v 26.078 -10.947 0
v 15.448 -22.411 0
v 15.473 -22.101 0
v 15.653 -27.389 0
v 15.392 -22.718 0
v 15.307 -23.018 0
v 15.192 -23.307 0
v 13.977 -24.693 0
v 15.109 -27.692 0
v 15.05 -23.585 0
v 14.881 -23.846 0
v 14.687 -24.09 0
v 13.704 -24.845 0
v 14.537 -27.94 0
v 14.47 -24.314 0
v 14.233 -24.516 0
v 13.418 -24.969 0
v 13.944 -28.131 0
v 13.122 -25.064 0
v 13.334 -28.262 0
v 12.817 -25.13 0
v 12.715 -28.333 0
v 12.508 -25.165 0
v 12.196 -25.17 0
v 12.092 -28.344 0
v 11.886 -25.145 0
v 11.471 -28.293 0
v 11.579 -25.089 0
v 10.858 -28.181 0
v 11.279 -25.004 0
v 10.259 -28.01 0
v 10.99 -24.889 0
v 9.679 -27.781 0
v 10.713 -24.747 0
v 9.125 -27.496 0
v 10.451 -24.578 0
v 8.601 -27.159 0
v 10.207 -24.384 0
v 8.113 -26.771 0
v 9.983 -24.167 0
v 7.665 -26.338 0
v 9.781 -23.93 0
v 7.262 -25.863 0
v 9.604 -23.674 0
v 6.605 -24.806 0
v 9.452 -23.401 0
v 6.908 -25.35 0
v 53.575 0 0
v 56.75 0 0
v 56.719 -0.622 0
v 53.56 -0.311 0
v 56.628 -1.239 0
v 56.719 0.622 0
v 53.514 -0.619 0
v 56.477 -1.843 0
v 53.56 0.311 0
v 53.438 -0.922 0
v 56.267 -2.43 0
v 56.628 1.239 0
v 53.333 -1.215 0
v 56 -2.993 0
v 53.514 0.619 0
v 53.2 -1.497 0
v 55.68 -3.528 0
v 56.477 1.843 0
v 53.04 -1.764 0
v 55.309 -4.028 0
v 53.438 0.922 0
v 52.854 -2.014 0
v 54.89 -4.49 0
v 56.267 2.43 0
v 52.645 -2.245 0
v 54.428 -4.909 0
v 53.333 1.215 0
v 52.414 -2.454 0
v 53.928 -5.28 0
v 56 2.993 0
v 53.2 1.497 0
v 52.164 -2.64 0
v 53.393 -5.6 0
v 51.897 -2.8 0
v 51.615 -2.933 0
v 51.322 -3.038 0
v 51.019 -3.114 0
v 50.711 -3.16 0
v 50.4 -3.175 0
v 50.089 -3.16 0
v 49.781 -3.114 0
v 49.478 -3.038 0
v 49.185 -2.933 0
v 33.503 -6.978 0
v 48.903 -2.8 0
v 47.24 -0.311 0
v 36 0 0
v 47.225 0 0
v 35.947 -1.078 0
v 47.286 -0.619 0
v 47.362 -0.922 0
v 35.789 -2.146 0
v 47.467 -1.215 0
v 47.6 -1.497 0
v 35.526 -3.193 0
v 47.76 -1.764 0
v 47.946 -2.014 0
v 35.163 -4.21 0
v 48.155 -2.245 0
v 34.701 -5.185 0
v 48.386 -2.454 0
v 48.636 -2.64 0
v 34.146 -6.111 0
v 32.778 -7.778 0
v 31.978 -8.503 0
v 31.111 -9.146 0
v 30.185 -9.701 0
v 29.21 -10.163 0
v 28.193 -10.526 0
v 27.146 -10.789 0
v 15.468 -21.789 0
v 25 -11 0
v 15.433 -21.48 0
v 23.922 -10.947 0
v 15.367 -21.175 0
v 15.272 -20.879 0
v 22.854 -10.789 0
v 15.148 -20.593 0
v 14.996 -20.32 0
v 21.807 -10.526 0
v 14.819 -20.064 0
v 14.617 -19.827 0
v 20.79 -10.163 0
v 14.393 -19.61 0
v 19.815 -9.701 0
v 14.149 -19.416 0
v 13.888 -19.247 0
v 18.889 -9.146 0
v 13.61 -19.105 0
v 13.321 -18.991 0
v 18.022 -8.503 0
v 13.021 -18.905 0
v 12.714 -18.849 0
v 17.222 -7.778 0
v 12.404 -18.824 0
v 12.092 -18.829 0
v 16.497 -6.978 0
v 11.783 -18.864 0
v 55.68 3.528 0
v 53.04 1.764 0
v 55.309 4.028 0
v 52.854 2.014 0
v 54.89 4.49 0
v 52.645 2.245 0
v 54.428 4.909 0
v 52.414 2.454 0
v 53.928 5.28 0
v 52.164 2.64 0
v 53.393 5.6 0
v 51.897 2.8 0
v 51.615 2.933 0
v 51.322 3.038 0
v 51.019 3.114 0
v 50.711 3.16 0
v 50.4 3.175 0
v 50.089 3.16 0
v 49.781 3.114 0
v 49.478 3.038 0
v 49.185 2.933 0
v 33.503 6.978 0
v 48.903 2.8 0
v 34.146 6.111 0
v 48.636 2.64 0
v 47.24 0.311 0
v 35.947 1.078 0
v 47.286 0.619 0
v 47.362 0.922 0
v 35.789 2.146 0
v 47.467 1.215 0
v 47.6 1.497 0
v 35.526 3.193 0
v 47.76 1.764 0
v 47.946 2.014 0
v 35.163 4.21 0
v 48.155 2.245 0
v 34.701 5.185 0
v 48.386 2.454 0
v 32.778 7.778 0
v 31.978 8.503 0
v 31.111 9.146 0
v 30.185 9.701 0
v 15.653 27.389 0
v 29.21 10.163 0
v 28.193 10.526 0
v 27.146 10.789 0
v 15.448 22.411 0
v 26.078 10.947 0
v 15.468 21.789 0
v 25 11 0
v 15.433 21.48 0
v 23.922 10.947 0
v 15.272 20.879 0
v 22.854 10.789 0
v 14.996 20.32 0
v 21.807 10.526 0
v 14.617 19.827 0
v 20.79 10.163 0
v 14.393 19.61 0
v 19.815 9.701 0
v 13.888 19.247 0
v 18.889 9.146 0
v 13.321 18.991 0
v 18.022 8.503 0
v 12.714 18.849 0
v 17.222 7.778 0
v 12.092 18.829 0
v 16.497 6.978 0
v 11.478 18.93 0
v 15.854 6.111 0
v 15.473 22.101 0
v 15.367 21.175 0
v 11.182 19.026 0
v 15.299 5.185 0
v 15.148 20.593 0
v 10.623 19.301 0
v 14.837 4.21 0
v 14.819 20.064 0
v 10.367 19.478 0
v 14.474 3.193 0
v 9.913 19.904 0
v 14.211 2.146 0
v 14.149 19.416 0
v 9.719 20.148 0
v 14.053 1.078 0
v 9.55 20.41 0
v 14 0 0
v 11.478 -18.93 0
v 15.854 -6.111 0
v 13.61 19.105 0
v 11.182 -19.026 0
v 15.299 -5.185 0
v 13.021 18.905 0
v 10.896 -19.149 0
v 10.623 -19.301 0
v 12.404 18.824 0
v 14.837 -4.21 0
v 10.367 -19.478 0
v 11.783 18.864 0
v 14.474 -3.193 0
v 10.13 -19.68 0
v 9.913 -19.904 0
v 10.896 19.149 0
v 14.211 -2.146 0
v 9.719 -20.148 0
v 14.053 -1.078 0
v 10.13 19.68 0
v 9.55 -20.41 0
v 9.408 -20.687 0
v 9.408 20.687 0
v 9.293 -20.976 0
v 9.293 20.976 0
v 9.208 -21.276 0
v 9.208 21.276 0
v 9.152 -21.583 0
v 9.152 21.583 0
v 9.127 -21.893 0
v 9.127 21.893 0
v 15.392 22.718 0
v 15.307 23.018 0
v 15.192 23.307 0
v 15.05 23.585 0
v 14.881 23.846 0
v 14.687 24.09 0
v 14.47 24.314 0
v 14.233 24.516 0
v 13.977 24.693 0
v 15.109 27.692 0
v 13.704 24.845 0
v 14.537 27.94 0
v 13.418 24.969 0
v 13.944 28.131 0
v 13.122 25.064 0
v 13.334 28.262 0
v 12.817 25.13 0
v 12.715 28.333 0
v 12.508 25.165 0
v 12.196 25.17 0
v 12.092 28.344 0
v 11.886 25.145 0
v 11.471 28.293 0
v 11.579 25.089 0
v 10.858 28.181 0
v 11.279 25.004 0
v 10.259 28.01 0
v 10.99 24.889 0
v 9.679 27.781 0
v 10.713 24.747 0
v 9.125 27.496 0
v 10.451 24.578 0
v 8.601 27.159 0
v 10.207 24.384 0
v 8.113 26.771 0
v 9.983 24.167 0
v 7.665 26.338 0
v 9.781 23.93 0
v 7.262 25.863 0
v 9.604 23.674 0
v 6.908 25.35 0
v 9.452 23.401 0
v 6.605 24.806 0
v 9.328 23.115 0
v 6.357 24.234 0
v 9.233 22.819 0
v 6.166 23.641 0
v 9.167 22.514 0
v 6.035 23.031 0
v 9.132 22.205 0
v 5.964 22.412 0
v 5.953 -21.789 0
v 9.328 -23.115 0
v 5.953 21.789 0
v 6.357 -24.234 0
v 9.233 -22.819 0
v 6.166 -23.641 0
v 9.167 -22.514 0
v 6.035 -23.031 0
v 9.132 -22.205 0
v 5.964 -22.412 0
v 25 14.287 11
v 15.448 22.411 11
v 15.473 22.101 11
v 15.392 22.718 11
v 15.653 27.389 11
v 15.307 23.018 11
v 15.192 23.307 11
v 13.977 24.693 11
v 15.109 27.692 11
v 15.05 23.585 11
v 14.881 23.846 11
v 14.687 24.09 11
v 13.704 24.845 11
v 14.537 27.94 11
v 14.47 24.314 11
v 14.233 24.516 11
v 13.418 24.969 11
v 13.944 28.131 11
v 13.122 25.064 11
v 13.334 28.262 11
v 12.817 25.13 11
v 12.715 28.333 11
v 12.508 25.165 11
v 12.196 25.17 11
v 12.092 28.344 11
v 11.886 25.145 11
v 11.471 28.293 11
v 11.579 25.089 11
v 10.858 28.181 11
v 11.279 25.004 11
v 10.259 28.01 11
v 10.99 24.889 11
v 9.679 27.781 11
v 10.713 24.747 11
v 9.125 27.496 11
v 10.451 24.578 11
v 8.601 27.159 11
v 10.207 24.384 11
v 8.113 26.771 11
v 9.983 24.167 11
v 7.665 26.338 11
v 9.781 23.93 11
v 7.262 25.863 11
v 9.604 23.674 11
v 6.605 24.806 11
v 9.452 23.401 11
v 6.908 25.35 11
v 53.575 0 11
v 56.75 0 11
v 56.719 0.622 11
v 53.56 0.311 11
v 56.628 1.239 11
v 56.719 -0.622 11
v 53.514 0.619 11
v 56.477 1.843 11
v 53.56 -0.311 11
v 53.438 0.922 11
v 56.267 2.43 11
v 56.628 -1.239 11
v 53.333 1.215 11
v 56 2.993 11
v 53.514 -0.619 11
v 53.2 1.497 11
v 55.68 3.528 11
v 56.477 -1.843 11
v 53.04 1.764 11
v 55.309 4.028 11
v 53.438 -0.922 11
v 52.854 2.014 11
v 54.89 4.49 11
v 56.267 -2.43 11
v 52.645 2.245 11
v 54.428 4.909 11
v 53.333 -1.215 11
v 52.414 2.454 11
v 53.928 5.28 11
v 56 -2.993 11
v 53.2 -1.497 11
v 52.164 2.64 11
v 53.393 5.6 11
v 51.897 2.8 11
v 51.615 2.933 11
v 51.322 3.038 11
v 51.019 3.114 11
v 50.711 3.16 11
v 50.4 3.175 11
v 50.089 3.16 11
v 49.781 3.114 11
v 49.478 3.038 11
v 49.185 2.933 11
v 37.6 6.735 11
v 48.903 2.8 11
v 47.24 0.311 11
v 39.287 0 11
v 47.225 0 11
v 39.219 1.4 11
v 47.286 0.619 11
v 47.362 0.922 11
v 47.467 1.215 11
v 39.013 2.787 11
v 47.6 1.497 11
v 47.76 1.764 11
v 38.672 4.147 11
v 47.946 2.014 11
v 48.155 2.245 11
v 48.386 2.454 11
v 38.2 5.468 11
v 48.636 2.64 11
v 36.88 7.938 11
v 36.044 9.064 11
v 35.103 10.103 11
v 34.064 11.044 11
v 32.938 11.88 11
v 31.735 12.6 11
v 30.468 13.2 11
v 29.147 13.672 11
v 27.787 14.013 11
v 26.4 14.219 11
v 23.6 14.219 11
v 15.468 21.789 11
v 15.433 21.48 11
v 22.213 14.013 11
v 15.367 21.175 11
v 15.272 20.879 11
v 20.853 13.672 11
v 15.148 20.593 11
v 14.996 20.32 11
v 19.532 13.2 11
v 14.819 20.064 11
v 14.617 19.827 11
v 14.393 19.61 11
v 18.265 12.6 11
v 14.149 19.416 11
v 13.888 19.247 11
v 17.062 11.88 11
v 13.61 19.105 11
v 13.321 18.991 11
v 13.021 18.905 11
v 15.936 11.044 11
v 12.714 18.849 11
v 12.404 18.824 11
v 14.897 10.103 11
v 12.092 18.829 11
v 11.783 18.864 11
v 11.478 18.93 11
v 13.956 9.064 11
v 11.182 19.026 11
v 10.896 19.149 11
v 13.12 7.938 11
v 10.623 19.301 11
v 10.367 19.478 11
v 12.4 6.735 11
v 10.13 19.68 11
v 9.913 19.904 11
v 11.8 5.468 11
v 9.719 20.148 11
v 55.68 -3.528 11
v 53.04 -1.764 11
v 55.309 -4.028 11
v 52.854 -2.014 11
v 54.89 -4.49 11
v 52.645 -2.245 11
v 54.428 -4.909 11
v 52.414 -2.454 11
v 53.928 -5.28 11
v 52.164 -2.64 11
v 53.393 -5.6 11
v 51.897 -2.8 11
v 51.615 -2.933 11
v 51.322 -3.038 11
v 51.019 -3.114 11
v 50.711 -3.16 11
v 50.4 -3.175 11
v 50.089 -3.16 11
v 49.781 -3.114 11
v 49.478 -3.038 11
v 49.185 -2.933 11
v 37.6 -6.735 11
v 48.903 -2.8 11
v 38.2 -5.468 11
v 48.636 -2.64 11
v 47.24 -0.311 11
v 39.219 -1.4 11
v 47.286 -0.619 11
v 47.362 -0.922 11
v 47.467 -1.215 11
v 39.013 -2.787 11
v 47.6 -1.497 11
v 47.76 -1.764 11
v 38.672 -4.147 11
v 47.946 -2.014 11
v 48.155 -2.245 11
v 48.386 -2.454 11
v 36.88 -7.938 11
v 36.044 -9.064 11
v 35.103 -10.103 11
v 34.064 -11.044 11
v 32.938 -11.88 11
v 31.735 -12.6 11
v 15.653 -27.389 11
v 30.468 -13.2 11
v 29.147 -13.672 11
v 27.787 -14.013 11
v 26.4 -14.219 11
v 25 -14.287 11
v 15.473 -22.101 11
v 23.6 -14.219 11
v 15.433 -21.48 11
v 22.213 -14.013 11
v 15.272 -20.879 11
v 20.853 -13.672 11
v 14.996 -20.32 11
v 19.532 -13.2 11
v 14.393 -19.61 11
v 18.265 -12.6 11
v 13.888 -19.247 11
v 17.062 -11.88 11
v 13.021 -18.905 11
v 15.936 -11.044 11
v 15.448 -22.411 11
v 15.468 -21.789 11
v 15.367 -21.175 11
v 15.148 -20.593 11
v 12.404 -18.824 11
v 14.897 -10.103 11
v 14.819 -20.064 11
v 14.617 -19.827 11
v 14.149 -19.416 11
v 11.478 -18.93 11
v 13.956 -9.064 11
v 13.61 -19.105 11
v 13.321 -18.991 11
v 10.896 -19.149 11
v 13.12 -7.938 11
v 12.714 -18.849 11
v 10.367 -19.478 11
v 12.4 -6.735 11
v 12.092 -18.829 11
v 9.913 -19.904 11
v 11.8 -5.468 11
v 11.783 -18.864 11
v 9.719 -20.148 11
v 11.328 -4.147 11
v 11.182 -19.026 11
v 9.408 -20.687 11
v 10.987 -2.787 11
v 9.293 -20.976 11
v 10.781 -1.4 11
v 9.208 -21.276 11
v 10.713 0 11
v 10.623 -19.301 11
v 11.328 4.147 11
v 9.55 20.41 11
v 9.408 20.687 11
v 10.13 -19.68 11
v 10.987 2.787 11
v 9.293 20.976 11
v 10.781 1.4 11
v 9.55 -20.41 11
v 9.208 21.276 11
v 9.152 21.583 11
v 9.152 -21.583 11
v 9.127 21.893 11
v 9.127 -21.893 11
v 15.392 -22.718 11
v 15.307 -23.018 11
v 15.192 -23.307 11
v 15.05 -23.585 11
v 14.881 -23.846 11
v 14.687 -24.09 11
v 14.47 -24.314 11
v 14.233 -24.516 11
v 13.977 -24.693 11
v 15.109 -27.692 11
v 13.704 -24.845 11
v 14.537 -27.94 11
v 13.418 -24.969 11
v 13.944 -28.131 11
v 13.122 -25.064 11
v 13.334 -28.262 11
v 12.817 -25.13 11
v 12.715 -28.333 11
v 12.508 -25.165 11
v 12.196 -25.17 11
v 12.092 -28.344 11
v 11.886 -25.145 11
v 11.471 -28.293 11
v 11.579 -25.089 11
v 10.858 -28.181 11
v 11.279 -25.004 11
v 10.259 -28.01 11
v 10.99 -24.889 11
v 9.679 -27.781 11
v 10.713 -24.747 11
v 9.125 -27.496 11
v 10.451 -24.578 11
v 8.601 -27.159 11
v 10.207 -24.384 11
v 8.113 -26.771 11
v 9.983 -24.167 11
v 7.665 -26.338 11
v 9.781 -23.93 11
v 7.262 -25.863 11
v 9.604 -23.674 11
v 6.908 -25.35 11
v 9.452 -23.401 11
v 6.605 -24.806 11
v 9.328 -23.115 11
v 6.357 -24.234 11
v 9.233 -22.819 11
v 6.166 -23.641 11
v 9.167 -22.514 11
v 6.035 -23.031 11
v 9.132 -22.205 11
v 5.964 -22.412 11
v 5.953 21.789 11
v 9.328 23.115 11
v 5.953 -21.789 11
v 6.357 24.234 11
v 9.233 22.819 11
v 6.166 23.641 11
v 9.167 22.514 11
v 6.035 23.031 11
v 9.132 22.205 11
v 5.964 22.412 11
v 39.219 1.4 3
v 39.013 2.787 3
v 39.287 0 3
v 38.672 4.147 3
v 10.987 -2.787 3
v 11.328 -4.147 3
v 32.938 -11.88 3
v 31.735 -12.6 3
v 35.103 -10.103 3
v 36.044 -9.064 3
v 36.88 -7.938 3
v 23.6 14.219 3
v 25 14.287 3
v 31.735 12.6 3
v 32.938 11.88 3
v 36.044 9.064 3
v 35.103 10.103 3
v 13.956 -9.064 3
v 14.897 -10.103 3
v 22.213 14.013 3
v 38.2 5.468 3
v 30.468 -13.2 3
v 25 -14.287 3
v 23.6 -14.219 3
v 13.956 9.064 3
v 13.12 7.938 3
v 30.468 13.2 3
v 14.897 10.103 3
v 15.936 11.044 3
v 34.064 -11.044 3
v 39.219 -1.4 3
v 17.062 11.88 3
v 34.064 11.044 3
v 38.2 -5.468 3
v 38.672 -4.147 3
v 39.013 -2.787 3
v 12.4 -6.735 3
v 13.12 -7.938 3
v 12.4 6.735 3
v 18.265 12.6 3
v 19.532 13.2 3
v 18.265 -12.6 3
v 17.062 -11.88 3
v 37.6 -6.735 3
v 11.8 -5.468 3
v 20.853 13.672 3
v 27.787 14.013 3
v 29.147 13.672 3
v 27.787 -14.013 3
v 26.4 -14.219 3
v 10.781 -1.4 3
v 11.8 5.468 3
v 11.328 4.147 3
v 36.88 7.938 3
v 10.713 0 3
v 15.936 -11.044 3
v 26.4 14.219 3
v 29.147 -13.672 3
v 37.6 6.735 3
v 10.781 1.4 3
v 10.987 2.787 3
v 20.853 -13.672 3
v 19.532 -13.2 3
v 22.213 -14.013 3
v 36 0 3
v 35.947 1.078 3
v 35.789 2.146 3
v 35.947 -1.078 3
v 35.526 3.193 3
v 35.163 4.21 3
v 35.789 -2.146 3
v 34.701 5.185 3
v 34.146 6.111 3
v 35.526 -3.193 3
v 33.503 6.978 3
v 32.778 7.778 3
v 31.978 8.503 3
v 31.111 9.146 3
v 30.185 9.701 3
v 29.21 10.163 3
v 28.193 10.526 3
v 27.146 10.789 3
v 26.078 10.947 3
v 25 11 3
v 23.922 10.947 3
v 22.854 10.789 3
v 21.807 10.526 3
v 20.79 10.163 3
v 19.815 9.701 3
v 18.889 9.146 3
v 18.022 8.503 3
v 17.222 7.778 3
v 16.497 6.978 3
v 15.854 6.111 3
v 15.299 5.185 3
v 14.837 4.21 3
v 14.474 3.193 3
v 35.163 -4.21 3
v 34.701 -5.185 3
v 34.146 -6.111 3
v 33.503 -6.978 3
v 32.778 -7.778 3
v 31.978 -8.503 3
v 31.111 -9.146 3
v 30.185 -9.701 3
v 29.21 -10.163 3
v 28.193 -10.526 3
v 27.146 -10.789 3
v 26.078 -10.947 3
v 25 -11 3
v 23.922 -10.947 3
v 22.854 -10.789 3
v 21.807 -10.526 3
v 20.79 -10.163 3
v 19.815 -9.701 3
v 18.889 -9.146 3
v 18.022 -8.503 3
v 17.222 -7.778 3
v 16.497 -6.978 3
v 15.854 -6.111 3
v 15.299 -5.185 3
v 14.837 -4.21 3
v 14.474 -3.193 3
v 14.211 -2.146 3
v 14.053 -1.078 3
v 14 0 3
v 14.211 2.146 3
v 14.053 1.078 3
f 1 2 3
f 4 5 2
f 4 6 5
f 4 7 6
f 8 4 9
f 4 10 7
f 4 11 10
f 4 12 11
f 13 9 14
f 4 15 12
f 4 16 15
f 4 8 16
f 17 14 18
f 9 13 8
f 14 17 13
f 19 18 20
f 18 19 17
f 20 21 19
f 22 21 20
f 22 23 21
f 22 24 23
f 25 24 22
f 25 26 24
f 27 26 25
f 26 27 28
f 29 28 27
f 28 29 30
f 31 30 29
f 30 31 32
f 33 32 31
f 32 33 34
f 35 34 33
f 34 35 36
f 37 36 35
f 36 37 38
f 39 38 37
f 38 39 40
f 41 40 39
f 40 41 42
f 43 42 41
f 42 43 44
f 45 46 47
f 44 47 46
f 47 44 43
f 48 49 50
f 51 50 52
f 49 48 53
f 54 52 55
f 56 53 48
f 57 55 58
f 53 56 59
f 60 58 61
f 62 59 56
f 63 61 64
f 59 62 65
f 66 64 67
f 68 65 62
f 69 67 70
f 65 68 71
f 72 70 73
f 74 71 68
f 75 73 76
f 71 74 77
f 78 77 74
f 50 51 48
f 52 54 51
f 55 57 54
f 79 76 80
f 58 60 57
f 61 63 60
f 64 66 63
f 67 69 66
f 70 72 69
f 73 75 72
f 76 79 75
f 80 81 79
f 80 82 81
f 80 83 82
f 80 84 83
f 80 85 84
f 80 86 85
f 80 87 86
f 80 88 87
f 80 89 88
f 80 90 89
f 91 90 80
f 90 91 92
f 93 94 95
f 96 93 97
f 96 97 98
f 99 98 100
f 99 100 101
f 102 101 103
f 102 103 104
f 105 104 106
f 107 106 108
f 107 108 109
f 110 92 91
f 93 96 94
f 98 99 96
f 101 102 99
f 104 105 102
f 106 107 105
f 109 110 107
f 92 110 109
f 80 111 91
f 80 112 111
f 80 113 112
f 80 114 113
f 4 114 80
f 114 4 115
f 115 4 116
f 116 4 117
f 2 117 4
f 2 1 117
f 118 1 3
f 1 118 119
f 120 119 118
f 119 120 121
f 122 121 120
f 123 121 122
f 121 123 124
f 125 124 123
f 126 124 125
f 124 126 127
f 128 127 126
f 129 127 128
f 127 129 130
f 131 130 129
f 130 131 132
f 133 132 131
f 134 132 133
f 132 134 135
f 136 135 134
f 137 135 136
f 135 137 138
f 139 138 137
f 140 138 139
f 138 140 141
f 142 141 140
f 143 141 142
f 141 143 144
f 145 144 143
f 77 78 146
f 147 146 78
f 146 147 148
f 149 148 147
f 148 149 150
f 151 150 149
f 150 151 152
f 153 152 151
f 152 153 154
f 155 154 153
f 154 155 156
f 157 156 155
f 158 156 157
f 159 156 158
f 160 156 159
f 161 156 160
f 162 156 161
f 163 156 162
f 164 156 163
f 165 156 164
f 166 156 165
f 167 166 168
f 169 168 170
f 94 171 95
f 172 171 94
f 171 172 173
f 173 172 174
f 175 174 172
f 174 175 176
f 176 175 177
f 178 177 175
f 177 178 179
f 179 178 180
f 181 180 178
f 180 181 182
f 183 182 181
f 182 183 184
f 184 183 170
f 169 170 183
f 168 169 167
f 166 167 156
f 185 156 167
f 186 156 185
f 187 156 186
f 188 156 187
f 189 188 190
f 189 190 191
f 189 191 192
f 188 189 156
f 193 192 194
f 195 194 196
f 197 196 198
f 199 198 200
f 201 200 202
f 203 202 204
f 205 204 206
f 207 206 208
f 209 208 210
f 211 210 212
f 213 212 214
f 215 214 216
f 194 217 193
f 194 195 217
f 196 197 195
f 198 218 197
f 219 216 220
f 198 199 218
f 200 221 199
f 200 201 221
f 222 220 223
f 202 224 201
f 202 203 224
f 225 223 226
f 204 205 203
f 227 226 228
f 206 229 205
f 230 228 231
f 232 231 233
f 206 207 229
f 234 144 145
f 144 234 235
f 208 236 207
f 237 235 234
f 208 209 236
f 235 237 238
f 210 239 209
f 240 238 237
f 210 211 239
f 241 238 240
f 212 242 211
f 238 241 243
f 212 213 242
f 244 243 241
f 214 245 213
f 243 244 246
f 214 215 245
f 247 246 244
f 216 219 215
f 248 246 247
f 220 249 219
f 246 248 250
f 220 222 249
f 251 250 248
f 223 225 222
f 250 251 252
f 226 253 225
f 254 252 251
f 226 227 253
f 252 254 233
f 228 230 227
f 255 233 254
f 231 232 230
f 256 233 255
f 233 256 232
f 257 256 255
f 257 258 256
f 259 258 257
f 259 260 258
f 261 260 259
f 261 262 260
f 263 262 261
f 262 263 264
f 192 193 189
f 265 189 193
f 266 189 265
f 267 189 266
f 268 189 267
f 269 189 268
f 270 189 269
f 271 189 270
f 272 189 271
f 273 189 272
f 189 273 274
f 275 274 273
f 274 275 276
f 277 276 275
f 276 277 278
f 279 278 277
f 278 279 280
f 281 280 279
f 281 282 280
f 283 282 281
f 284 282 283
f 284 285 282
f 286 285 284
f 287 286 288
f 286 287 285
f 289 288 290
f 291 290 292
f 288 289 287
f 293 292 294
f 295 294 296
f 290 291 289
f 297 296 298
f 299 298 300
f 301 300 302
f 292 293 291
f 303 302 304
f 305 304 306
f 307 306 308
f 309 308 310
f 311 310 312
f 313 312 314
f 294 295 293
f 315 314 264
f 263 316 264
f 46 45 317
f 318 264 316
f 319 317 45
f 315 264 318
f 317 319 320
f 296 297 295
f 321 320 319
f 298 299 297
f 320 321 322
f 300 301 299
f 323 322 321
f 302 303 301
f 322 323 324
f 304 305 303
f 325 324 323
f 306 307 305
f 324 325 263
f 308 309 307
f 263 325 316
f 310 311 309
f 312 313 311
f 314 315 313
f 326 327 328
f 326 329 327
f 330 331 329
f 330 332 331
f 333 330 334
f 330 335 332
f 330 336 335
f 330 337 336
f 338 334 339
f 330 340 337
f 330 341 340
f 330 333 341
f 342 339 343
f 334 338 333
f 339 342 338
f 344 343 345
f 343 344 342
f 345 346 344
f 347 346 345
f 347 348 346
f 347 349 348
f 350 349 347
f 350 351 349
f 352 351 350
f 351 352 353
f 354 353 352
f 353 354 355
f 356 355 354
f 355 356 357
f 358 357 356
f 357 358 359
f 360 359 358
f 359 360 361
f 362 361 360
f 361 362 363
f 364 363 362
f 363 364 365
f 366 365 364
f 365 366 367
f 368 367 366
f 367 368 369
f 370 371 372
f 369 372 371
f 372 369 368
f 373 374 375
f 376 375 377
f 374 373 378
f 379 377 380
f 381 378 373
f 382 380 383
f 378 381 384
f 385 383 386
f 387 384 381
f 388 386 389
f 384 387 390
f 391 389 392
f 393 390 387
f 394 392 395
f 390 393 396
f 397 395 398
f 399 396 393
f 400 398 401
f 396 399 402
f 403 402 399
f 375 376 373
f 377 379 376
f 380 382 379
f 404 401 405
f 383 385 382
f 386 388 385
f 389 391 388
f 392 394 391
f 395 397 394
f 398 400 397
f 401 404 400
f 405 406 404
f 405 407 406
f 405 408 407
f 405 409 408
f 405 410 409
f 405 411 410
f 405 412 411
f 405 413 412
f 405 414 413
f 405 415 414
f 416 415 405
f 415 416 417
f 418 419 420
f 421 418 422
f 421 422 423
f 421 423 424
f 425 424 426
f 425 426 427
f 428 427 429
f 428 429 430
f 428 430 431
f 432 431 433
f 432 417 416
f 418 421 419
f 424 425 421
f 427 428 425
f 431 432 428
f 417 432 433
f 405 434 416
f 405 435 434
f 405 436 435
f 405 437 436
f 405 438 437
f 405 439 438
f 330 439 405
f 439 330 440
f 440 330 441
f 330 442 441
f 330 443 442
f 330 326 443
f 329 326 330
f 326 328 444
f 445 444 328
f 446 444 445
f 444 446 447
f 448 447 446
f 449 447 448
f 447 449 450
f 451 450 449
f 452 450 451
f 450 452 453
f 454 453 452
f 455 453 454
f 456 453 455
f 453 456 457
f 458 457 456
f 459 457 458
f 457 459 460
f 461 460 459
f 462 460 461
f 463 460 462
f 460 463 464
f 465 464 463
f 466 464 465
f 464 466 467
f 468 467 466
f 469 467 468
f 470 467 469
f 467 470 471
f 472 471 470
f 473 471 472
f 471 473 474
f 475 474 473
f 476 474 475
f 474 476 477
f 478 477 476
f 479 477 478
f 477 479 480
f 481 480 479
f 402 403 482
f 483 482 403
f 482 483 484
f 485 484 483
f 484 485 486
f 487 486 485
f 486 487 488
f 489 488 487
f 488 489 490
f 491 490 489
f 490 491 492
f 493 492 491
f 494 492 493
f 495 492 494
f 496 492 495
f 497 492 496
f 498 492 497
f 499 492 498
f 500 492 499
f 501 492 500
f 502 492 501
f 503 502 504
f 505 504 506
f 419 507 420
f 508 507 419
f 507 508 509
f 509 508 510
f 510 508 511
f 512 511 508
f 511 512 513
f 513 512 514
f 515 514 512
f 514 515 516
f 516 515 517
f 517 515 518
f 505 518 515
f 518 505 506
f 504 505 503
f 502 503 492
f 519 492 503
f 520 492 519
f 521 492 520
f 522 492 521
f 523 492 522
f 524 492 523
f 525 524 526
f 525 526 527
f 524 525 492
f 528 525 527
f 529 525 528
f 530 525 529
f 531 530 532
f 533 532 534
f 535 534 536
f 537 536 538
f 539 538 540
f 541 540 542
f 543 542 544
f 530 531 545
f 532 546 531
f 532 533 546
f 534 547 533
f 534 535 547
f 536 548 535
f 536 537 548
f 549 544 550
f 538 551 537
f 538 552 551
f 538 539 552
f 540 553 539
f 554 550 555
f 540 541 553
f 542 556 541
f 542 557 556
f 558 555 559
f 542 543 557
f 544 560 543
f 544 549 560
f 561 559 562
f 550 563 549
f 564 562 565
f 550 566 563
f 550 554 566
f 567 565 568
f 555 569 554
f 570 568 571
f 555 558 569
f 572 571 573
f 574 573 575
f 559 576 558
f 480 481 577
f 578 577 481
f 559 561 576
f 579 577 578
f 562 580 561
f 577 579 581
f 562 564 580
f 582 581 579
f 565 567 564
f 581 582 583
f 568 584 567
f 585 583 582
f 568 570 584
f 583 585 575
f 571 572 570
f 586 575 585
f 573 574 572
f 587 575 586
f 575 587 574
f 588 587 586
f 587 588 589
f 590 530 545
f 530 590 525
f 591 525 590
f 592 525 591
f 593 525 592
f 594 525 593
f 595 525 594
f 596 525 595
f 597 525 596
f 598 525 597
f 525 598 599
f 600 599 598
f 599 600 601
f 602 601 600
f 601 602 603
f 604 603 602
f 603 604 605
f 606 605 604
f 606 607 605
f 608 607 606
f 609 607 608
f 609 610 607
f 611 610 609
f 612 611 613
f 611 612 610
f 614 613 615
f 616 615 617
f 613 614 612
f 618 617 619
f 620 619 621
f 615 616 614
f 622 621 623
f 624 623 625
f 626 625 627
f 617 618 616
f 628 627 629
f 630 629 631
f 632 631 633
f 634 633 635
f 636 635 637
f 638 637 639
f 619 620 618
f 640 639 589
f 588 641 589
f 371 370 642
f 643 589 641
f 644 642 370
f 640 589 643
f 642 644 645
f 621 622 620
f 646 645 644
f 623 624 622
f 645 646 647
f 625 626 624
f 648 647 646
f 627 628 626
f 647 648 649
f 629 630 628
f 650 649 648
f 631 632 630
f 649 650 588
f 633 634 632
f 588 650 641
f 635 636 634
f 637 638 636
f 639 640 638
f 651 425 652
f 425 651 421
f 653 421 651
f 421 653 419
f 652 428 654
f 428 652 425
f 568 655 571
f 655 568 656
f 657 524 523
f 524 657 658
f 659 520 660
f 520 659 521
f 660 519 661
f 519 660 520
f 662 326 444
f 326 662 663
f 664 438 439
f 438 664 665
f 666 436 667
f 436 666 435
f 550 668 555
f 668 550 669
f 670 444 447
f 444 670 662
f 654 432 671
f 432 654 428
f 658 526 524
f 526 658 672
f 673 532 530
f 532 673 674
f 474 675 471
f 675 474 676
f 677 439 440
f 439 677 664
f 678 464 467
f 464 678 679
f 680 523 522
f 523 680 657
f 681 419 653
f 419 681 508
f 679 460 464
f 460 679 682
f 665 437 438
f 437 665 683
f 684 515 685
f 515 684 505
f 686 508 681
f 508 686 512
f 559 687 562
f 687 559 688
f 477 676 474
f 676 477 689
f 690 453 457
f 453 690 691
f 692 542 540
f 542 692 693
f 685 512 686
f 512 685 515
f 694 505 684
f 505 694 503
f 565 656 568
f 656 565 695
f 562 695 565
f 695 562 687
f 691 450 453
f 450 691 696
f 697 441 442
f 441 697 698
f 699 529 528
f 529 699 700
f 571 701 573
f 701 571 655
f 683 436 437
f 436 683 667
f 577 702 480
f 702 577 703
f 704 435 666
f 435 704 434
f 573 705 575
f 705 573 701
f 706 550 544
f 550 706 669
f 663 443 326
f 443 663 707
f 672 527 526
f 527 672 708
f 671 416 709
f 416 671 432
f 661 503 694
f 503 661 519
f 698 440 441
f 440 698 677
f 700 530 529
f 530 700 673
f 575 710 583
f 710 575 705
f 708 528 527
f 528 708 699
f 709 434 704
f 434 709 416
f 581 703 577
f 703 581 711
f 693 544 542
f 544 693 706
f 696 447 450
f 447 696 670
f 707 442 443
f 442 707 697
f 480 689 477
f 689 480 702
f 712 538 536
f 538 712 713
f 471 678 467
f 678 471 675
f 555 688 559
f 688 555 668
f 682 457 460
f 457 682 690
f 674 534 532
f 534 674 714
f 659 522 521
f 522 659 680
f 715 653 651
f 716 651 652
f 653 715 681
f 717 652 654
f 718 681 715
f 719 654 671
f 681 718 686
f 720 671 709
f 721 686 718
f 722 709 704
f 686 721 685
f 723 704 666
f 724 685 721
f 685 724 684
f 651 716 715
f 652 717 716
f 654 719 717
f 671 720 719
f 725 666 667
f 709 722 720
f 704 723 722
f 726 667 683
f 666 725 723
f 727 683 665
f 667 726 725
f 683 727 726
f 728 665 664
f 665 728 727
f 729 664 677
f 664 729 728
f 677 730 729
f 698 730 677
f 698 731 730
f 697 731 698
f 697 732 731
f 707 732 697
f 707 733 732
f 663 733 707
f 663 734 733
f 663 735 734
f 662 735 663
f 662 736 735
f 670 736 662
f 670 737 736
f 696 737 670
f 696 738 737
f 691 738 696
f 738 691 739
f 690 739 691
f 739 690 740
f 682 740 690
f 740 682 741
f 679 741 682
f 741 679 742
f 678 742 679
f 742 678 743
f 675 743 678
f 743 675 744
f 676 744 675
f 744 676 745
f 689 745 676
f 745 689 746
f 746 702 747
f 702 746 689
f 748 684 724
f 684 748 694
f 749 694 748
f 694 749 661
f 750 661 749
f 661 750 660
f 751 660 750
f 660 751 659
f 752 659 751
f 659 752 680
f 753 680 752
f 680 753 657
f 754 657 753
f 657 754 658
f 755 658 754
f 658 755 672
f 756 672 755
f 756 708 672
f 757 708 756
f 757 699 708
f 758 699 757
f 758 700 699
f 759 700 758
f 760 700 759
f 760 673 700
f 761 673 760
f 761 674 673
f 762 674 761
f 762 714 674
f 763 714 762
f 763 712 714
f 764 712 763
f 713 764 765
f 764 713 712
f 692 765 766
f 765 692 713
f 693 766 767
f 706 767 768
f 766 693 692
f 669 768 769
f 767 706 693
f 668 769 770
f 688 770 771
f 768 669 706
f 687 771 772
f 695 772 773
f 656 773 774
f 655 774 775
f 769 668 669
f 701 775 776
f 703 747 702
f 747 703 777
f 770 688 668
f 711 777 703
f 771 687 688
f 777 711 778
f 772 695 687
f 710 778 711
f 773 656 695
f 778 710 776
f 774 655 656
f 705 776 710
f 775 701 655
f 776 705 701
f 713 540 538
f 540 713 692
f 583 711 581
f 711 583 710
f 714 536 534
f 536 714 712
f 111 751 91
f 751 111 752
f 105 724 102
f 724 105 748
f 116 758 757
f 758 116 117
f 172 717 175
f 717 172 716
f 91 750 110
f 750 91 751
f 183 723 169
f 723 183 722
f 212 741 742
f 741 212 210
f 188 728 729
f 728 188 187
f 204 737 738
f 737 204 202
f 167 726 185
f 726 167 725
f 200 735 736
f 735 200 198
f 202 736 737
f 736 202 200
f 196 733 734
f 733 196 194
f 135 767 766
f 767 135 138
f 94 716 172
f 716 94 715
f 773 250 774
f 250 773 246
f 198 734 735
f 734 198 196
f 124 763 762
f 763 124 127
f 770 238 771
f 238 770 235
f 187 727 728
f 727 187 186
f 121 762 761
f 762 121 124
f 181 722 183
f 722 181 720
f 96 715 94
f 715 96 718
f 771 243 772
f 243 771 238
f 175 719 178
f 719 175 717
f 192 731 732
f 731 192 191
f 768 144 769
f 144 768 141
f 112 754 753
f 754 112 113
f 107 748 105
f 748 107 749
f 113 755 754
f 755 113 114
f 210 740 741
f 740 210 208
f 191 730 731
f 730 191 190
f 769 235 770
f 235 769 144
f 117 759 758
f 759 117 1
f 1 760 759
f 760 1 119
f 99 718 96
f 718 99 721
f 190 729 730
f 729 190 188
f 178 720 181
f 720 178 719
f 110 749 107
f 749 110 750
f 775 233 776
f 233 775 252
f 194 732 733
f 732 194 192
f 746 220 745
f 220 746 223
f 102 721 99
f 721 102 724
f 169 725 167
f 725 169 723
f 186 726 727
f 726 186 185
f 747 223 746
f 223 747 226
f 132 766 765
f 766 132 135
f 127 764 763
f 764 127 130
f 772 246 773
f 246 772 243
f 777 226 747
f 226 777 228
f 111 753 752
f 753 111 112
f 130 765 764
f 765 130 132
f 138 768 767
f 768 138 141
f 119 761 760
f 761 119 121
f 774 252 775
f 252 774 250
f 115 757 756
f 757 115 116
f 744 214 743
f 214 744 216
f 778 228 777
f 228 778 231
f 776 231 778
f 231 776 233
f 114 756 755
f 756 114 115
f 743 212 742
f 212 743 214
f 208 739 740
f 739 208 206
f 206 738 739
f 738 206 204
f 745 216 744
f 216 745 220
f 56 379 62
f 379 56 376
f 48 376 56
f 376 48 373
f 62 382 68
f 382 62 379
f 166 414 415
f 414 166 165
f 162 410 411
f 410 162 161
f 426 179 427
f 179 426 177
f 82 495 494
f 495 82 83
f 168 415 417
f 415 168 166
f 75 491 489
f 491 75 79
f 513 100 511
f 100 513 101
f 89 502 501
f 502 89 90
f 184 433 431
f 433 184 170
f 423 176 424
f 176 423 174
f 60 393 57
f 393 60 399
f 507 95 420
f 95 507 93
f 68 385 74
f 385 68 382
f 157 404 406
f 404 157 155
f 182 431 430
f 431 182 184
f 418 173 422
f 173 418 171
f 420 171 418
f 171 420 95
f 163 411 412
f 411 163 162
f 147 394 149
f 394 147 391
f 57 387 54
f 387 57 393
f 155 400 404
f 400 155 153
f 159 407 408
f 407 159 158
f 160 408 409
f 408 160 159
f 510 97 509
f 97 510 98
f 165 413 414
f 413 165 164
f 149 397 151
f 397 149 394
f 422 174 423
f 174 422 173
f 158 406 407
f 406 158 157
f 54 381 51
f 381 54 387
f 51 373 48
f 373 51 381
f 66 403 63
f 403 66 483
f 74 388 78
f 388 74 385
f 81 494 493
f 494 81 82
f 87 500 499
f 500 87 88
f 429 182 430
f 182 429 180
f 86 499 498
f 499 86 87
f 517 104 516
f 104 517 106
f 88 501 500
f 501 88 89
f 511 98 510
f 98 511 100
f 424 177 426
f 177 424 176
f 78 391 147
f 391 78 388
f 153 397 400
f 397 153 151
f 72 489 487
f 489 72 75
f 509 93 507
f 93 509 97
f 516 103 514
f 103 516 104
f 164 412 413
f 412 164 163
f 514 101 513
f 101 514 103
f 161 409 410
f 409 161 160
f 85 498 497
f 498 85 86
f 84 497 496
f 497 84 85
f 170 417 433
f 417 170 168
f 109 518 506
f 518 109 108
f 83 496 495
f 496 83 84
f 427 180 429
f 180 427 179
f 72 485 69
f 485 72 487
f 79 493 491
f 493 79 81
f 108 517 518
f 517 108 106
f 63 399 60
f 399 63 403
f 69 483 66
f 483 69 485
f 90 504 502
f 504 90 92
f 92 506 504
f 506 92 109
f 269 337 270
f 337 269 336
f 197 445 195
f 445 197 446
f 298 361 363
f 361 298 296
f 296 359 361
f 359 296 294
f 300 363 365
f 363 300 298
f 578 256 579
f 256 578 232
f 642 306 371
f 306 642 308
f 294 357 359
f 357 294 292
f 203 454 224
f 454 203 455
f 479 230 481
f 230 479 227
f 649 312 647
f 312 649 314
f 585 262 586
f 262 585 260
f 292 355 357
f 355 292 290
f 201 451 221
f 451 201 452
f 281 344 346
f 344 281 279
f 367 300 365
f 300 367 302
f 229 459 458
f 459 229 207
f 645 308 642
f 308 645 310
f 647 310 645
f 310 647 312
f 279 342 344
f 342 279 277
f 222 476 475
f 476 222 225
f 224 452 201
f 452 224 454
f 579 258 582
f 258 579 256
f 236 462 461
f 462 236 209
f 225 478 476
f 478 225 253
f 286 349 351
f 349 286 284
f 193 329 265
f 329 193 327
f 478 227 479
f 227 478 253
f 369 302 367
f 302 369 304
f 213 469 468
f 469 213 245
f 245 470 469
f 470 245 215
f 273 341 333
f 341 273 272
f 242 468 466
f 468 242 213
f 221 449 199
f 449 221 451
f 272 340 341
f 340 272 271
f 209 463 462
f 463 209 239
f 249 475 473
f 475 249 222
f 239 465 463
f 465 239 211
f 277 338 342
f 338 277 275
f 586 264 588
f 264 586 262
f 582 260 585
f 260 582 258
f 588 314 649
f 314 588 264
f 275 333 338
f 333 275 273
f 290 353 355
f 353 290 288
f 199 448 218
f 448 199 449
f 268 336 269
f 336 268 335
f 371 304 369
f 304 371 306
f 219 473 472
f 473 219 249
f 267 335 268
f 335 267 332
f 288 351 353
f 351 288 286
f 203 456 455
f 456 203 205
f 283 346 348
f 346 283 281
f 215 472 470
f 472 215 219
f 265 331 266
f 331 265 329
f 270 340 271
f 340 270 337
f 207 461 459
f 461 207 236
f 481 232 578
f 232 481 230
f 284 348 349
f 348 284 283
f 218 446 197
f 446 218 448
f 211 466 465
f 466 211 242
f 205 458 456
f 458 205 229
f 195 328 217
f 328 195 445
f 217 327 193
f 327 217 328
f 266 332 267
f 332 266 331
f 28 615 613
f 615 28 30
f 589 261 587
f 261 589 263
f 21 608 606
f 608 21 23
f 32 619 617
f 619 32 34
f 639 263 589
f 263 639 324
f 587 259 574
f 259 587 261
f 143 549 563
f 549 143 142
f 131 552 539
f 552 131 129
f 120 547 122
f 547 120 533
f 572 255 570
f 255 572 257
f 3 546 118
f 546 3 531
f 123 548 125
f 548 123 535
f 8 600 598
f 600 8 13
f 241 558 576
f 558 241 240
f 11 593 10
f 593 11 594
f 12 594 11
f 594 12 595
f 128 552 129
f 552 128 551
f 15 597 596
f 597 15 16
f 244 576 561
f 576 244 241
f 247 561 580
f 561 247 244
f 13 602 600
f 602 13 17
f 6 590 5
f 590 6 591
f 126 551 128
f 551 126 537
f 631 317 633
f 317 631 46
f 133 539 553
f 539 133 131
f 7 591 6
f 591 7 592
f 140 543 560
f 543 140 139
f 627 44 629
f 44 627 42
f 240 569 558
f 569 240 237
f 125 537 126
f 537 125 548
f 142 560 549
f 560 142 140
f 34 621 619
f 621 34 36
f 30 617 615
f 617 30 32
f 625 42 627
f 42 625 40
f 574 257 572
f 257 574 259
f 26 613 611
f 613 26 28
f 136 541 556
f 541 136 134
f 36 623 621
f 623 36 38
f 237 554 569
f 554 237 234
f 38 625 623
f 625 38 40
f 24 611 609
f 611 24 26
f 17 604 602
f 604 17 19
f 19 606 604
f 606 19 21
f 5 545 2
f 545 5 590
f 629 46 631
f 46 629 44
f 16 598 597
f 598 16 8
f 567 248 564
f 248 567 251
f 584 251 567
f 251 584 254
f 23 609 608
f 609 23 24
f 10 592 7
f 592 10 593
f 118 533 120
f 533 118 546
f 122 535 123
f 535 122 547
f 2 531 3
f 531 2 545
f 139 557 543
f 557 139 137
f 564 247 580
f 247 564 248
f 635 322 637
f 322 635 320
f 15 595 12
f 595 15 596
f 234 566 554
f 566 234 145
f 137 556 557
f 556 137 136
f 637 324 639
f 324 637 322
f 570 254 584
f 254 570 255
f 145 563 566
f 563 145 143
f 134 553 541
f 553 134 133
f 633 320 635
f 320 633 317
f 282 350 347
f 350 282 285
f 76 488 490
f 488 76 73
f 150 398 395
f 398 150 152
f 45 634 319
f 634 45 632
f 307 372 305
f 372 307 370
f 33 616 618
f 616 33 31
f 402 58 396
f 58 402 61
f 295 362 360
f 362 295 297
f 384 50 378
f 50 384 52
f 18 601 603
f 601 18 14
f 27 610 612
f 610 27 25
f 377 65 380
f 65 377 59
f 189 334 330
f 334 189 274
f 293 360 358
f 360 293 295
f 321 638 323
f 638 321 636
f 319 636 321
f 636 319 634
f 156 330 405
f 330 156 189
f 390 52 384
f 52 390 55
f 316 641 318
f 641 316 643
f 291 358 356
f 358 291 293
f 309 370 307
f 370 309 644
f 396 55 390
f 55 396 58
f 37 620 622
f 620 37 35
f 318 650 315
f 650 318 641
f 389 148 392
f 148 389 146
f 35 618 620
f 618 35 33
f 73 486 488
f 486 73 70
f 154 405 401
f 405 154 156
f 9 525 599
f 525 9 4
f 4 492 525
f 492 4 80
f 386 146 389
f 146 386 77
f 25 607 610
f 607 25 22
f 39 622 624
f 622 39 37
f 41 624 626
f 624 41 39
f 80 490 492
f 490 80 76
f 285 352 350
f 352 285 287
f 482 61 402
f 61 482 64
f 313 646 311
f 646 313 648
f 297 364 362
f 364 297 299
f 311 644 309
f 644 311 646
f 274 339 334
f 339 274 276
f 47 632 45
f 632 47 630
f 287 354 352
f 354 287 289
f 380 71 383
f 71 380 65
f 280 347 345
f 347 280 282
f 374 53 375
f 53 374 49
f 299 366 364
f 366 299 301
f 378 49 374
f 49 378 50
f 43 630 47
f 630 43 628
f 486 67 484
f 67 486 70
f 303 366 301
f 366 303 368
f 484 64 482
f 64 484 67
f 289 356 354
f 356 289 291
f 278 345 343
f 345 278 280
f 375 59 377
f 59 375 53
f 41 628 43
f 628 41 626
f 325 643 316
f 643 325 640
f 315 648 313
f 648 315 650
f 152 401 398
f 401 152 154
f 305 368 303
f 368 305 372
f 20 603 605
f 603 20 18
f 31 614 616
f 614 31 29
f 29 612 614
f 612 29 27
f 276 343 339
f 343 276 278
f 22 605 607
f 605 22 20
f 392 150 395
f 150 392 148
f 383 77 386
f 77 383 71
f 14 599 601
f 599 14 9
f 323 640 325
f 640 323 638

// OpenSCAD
$inch = 25.4;

$top = 0;

module bolt_chassis(height) {
    difference() {
        //cylinder(d=2*$inch, h=height, $fn=64);
        hull() {
            for (nub = [0:2]) {
                rotate(nub*120, [0,0,1]) {
                    translate([2*$inch / 2, 0,0]) {
                        cylinder(d=0.5*$inch, h=height, $fn=64);
                    }
                }
            }            
        }
        cylinder(d=1.35*$inch, h=height, $fn=64);
        for (bolthole = [0:2]) {
            rotate(bolthole*120, [0,0,1]) {
                translate([2*$inch / 2, 0,-1]) {
                    cylinder(d=1/4*$inch, h=height+2, $fn=64);
                }
            }
        }
    }
}

module top_body() {
    difference() {
        translate([0,0,0]) {
            cylinder(d=1.35*$inch, h=23, $fn=64);
        }
        translate([0,0,15]) {
            cylinder(d=1.125*$inch, h=8, $fn=64);
        }
        // hex head
        translate([0,0,8]) {
            cylinder(d=(7/16*$inch)+0.5, h=8, $fn=6);
        }
        // ease the edges of the hex hole
        translate([0,0,11.5]) {
            cylinder(d1=0.3*$inch, d2=0.6*$inch, h=5, $fn=6);
        }
        // bolt thru hole
        translate([0,0,-1]) {
            cylinder(d=(1/4*$inch), h=31, $fn=64);
        }
    }
}

module bottom_body() {
    difference() {
        translate([0,0,0]) {
            cylinder(d=1.35*$inch, h=11, $fn=64);
        }
        translate([0,0,3]) {
            cylinder(d=1.125*$inch, h=8, $fn=64);
        }
        // bottom thru hole for knife mount
        translate([0,0,-1]) {
            cylinder(d=22, h=13, $fn=64);
        }
    }
}

if ($top) {
    translate([25,0,0]) {
        union() {
            top_body();
            bolt_chassis(23);
        }
    }
} else {
    translate([25,0,0]) {
        union() {
            bottom_body();
            bolt_chassis(11);
        }
    }
}
